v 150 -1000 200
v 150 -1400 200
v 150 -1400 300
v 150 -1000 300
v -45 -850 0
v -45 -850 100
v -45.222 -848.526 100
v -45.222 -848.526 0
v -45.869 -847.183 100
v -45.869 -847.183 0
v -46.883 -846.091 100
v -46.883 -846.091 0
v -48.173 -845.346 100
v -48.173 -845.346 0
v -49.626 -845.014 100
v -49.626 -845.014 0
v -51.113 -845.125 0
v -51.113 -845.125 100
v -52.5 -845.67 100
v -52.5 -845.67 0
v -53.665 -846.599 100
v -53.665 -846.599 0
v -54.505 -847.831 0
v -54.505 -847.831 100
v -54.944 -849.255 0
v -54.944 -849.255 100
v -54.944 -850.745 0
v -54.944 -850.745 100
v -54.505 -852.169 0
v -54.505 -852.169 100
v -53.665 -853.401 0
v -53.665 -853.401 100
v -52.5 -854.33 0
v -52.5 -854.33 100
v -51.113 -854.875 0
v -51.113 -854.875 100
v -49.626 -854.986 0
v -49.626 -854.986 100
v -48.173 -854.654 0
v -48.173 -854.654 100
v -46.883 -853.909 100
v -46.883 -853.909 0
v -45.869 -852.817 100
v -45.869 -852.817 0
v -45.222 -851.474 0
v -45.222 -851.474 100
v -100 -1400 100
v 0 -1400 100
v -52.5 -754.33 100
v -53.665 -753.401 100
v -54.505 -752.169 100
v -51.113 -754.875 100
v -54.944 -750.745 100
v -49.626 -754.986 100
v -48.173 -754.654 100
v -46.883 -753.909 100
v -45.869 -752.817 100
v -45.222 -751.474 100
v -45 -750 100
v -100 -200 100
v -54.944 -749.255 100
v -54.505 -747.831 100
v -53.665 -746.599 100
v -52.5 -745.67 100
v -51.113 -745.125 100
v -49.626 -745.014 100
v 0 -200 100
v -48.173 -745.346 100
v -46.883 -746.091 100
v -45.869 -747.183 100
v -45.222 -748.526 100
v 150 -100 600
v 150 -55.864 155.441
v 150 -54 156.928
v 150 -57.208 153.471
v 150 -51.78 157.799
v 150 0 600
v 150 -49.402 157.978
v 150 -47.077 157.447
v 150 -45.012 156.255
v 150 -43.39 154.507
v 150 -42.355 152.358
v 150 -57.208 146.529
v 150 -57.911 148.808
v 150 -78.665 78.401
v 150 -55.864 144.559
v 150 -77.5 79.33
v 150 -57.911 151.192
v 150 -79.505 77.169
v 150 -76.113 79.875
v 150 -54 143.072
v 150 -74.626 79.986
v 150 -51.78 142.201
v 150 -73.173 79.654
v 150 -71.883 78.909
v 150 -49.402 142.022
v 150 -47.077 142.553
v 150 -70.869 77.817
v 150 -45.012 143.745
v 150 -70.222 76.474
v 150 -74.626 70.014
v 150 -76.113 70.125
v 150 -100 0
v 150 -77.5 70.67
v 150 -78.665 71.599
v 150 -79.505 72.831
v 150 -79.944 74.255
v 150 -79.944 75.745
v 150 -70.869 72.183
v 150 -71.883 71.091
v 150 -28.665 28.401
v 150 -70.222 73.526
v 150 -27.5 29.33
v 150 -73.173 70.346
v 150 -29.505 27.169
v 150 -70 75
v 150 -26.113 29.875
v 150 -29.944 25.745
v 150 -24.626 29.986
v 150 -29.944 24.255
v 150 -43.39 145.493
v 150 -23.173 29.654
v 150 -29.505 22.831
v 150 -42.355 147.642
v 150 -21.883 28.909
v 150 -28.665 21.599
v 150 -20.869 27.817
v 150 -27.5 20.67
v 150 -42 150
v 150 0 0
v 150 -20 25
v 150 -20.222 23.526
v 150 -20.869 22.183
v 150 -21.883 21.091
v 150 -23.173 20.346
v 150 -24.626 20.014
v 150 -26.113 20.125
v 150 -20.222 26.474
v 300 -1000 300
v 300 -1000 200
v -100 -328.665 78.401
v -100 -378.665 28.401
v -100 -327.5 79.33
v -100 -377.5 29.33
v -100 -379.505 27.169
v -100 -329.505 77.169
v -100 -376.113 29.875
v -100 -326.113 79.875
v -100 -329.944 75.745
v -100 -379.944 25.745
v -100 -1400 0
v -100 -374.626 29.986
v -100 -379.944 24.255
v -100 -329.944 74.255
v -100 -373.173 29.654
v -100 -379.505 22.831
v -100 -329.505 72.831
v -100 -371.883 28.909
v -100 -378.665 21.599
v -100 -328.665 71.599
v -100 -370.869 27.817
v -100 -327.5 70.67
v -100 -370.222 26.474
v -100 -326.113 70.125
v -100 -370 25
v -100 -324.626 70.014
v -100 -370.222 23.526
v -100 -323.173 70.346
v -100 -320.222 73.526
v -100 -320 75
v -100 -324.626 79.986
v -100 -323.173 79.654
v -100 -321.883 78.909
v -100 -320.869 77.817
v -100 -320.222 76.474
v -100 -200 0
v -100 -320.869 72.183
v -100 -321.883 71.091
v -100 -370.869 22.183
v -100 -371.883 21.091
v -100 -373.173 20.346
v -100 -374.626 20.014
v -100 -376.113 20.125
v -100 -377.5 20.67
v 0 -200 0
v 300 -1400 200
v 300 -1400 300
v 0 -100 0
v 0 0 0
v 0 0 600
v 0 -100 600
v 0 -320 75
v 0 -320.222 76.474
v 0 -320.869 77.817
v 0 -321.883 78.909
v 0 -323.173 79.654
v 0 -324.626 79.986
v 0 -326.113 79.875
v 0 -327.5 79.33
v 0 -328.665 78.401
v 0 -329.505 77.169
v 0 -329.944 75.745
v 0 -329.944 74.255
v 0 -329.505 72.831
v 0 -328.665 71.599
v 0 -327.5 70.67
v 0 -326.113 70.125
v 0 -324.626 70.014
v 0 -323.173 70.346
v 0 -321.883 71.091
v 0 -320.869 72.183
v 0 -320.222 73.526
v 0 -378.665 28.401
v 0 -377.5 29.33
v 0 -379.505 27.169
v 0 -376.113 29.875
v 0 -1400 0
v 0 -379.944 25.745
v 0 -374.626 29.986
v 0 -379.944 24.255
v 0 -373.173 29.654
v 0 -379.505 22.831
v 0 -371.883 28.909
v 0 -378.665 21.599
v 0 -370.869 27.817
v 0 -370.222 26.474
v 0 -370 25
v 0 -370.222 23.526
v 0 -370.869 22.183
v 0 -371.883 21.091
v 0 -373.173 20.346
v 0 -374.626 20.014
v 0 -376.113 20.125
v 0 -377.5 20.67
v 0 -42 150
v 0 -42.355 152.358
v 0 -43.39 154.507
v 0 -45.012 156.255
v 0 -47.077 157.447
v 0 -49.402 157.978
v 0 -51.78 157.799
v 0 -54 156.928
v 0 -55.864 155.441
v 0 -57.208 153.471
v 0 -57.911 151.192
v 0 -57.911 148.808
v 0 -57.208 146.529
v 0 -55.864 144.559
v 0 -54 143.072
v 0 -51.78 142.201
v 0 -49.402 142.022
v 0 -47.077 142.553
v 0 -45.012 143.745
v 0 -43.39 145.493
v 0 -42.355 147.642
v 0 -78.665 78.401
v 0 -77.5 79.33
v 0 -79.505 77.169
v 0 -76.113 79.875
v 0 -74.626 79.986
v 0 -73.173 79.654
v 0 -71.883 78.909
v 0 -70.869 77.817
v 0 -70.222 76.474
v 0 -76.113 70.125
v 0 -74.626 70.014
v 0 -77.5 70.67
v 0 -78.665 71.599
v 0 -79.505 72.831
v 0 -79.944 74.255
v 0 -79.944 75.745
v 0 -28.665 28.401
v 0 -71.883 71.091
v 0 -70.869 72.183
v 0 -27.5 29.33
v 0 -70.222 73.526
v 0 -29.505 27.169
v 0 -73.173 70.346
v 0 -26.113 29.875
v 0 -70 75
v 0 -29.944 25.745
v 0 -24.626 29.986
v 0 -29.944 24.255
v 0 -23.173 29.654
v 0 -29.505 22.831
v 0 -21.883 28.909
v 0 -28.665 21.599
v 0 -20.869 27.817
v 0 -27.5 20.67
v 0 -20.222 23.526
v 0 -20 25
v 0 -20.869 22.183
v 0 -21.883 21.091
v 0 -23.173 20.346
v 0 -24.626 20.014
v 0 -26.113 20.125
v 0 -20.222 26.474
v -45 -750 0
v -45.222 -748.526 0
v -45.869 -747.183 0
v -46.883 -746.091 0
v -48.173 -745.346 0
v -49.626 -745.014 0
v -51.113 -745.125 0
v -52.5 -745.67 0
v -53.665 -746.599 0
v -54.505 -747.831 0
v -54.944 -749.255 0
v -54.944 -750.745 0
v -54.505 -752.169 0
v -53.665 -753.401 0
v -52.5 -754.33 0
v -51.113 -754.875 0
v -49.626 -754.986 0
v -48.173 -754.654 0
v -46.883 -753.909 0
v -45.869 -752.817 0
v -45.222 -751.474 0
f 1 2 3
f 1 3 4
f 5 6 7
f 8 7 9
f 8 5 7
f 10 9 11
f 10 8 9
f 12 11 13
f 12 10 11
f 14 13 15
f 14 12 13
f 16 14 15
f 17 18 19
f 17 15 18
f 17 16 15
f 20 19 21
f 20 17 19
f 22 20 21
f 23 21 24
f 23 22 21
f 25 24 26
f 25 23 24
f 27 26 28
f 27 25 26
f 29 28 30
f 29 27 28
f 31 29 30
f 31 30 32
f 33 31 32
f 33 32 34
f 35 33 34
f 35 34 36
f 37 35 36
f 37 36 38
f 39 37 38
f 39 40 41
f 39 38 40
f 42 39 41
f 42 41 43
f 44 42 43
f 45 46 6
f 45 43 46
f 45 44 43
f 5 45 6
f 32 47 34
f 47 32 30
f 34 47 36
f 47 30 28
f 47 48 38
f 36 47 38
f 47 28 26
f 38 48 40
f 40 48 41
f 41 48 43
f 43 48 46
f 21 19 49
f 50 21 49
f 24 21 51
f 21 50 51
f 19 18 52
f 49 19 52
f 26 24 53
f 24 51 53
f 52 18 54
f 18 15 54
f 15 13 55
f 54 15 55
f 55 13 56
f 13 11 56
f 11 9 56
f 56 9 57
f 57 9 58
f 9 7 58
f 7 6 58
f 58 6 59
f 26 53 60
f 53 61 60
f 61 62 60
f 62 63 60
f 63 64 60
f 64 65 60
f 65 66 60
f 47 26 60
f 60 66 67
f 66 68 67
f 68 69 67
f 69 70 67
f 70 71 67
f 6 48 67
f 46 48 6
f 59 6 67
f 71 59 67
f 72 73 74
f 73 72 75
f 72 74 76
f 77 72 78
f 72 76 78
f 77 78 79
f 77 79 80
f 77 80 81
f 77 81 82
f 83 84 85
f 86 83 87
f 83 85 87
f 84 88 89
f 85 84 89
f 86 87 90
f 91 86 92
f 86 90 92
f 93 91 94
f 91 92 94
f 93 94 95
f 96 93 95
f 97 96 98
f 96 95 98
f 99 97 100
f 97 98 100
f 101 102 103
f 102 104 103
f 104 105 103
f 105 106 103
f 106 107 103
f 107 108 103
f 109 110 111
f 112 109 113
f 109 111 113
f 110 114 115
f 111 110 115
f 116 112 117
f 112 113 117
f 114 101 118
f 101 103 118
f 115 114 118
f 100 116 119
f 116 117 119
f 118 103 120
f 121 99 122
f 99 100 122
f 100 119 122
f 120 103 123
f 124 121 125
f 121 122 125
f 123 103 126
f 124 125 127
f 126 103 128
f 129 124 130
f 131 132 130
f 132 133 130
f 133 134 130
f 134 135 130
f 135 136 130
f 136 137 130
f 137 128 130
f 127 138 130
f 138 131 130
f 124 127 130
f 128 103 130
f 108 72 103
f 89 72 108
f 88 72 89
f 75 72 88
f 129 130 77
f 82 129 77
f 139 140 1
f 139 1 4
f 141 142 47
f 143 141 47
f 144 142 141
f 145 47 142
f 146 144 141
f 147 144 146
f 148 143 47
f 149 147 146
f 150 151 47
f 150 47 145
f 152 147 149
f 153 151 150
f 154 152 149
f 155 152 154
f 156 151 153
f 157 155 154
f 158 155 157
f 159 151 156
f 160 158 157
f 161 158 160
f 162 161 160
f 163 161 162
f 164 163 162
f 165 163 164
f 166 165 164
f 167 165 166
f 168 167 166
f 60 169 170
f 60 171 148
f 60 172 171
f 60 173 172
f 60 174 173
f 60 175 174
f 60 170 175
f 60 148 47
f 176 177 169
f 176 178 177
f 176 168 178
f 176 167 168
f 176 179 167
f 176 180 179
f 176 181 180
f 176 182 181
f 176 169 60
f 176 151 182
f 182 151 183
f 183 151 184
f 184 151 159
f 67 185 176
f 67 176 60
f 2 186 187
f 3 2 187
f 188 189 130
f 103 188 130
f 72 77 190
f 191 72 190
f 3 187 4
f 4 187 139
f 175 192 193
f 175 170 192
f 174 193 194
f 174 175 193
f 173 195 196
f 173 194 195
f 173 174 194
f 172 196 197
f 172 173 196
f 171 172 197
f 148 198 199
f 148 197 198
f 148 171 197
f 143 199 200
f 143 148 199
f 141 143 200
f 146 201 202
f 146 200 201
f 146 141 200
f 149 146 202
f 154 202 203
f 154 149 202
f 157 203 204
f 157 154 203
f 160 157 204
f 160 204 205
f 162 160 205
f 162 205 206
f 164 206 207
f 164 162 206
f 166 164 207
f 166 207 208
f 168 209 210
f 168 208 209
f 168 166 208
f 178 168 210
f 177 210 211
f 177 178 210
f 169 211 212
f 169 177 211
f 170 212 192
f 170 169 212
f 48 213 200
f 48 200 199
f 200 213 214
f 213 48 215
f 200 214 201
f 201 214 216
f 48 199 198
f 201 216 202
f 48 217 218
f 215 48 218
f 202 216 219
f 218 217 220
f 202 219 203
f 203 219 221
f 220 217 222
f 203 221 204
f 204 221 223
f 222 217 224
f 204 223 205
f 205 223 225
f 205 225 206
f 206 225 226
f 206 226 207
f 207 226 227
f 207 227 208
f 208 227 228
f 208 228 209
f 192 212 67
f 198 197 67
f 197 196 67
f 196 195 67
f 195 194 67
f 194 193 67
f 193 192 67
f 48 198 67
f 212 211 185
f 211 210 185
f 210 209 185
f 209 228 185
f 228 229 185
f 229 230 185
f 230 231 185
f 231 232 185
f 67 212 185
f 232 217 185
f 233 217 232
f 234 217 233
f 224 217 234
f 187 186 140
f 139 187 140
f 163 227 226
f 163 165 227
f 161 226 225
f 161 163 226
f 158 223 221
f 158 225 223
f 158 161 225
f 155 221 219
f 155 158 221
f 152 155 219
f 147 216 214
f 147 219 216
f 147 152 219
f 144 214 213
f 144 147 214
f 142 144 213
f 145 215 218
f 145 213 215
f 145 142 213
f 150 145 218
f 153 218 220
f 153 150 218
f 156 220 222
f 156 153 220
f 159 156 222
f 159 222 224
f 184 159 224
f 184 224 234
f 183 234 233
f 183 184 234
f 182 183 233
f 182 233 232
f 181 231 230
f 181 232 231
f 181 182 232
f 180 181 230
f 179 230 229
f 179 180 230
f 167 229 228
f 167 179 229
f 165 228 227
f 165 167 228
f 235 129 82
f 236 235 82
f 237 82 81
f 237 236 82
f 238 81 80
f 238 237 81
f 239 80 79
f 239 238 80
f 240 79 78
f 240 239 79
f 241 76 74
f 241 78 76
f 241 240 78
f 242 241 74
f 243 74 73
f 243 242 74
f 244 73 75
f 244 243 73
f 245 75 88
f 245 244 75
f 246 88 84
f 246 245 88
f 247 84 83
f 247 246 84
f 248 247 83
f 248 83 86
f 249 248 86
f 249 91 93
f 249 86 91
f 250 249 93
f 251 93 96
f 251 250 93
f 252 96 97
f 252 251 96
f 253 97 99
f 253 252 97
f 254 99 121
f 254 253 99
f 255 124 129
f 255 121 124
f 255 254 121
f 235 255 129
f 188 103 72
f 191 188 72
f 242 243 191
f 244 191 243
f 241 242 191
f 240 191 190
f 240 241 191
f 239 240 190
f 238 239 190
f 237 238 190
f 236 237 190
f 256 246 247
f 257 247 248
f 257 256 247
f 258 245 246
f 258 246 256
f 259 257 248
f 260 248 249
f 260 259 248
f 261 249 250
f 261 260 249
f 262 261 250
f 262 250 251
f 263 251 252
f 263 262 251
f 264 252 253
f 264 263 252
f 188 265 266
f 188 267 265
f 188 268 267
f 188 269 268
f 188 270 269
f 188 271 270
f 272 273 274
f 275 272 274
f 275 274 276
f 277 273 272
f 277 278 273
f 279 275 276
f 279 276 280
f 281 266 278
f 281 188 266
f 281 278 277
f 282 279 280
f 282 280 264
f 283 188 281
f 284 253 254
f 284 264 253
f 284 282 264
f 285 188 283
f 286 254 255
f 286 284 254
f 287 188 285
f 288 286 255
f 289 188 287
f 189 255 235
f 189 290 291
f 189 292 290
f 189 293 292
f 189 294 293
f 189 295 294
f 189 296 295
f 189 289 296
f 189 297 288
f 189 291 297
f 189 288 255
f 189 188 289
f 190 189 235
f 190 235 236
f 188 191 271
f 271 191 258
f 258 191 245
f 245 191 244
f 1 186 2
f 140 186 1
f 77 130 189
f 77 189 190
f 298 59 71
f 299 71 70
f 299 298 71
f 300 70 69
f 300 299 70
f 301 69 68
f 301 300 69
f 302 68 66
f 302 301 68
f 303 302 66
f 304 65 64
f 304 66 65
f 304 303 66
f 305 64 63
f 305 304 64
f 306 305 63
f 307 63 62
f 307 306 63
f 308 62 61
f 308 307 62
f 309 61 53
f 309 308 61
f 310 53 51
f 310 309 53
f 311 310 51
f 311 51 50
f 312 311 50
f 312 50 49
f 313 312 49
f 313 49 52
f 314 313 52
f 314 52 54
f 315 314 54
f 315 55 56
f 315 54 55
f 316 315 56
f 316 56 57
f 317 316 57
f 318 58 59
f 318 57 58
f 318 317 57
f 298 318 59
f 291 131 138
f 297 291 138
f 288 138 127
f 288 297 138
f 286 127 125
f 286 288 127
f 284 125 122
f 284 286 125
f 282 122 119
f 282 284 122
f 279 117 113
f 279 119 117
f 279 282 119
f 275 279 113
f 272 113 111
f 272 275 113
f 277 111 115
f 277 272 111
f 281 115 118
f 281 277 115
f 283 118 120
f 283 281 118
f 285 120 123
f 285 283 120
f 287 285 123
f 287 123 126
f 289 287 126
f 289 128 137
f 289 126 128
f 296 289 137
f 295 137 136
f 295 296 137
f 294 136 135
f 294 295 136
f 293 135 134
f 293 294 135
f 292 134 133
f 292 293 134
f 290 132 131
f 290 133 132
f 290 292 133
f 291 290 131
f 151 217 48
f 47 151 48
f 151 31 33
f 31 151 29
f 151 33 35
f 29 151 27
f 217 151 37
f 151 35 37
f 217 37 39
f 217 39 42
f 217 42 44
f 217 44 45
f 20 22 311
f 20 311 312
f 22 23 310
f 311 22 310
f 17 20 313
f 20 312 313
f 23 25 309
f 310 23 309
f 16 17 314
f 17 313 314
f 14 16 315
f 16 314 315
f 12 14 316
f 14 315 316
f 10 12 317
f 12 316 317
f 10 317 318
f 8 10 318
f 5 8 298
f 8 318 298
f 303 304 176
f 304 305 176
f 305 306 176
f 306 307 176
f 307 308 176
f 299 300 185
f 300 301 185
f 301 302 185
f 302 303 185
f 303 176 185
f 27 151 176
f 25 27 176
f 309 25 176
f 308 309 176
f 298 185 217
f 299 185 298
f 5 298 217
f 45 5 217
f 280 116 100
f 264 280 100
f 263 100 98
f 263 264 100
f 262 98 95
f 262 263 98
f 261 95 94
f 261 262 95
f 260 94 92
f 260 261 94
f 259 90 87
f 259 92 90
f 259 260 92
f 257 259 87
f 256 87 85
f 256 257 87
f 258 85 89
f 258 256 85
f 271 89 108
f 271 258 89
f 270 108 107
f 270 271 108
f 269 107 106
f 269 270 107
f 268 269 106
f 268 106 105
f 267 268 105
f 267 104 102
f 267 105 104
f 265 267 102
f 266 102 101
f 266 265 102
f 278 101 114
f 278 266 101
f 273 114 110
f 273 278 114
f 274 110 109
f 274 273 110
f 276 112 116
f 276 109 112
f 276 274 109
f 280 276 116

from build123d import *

# Parameters (mm, degrees)
F0_W     = 400
F0_H     = 100
F3_DEPTH = 423
F0_W_2   = 1200
F0_W_3   = 20
F0_H_2   = 20
F0_R     = 5
F0_W_4   = 100
F0_H_3   = 650
F0_R_2   = 8
F1_W     = 150
F1_H     = 100
F1_W_2   = 100
F1_H_2   = 1200
F1_R     = 5
F1_H_3   = 400
F4_DEPTH = 1000
F5_DEPTH = 1520


with BuildPart() as f3:
    # F0 (on Right) → F3 (new body, symmetric)
    with BuildSketch(Plane.YZ):
        with Locations((-1200, 250)):
            Rectangle(F0_W, F0_H)
    extrude(amount=F3_DEPTH, both=True)


with BuildPart() as f3b:
    # F0 (on Right) → F3, piece 2 (new body, symmetric)
    with BuildSketch(Plane.YZ):
        with Locations((-800, 50)):
            Rectangle(F0_W_2, F0_H)
        with Locations((-375, 25)):
            Rectangle(F0_W_3, F0_H_2, mode=Mode.SUBTRACT)
        with Locations((-325, 75)):
            Rectangle(F0_W_3, F0_H_2, mode=Mode.SUBTRACT)
        with Locations((-325, 75)):
            Rectangle(F0_W_3, F0_H_2)
        with Locations((-325, 75)):
            Circle(F0_R, mode=Mode.SUBTRACT)
        with Locations((-375, 25)):
            Rectangle(F0_W_3, F0_H_2)
        with Locations((-375, 25)):
            Circle(F0_R, mode=Mode.SUBTRACT)
    extrude(amount=F3_DEPTH, both=True)


with BuildPart() as f3c:
    # F0 (on Right) → F3, piece 3 (new body, symmetric)
    with BuildSketch(Plane.YZ):
        with Locations((-50, 325)):
            Rectangle(F0_W_4, F0_H_3)
        with Locations((-25, 25)):
            Circle(F0_R, mode=Mode.SUBTRACT)
        with Locations((-75, 75)):
            Circle(F0_R, mode=Mode.SUBTRACT)
        with Locations((-50, 150)):
            Circle(F0_R_2, mode=Mode.SUBTRACT)
    extrude(amount=F3_DEPTH, both=True)


with BuildPart() as f4_tool:
    # F1 (on Top) → F4 (new body)
    with BuildSketch(Plane.XY):
        with Locations((75, -50)):
            Rectangle(F1_W, F1_H)
        with Locations((-50, -800)):
            Rectangle(F1_W_2, F1_H_2)
        with Locations((-50, -850)):
            Circle(F1_R, mode=Mode.SUBTRACT)
        with Locations((-50, -750)):
            Circle(F1_R, mode=Mode.SUBTRACT)
        with Locations((225, -1200)):
            Rectangle(F1_W, F1_H_3)
    extrude(amount=F4_DEPTH)


with BuildPart() as f3_1:
    add(f3.part)

    # F4: intersect by f4_tool
    add(f4_tool.part, mode=Mode.INTERSECT)


with BuildPart() as f3b_1:
    add(f3b.part)

    # F4: intersect by f4_tool
    add(f4_tool.part, mode=Mode.INTERSECT)


with BuildPart() as f3c_1:
    add(f3c.part)

    # F4: intersect by f4_tool
    add(f4_tool.part, mode=Mode.INTERSECT)


with BuildPart() as f5_tool:
    # F2 (on Front) → F5 (new body)
    with BuildSketch(Plane.XZ):
        Polygon((-100, 0), (0, 0), (150, 0), (150, 200), (300, 200), (300, 300), (150, 300), (150, 600), (0, 600), (0, 100), (-100, 100), align=None)
    extrude(amount=F5_DEPTH)


with BuildPart() as f3_2:
    add(f3_1.part)

    # F5: intersect by f5_tool
    add(f5_tool.part, mode=Mode.INTERSECT)


with BuildPart() as f3b_2:
    add(f3b_1.part)

    # F5: intersect by f5_tool
    add(f5_tool.part, mode=Mode.INTERSECT)


with BuildPart() as f3c_2:
    add(f3c_1.part)

    # F5: intersect by f5_tool
    add(f5_tool.part, mode=Mode.INTERSECT)


solid = Compound([f3_2.part, f3b_2.part, f3c_2.part])
